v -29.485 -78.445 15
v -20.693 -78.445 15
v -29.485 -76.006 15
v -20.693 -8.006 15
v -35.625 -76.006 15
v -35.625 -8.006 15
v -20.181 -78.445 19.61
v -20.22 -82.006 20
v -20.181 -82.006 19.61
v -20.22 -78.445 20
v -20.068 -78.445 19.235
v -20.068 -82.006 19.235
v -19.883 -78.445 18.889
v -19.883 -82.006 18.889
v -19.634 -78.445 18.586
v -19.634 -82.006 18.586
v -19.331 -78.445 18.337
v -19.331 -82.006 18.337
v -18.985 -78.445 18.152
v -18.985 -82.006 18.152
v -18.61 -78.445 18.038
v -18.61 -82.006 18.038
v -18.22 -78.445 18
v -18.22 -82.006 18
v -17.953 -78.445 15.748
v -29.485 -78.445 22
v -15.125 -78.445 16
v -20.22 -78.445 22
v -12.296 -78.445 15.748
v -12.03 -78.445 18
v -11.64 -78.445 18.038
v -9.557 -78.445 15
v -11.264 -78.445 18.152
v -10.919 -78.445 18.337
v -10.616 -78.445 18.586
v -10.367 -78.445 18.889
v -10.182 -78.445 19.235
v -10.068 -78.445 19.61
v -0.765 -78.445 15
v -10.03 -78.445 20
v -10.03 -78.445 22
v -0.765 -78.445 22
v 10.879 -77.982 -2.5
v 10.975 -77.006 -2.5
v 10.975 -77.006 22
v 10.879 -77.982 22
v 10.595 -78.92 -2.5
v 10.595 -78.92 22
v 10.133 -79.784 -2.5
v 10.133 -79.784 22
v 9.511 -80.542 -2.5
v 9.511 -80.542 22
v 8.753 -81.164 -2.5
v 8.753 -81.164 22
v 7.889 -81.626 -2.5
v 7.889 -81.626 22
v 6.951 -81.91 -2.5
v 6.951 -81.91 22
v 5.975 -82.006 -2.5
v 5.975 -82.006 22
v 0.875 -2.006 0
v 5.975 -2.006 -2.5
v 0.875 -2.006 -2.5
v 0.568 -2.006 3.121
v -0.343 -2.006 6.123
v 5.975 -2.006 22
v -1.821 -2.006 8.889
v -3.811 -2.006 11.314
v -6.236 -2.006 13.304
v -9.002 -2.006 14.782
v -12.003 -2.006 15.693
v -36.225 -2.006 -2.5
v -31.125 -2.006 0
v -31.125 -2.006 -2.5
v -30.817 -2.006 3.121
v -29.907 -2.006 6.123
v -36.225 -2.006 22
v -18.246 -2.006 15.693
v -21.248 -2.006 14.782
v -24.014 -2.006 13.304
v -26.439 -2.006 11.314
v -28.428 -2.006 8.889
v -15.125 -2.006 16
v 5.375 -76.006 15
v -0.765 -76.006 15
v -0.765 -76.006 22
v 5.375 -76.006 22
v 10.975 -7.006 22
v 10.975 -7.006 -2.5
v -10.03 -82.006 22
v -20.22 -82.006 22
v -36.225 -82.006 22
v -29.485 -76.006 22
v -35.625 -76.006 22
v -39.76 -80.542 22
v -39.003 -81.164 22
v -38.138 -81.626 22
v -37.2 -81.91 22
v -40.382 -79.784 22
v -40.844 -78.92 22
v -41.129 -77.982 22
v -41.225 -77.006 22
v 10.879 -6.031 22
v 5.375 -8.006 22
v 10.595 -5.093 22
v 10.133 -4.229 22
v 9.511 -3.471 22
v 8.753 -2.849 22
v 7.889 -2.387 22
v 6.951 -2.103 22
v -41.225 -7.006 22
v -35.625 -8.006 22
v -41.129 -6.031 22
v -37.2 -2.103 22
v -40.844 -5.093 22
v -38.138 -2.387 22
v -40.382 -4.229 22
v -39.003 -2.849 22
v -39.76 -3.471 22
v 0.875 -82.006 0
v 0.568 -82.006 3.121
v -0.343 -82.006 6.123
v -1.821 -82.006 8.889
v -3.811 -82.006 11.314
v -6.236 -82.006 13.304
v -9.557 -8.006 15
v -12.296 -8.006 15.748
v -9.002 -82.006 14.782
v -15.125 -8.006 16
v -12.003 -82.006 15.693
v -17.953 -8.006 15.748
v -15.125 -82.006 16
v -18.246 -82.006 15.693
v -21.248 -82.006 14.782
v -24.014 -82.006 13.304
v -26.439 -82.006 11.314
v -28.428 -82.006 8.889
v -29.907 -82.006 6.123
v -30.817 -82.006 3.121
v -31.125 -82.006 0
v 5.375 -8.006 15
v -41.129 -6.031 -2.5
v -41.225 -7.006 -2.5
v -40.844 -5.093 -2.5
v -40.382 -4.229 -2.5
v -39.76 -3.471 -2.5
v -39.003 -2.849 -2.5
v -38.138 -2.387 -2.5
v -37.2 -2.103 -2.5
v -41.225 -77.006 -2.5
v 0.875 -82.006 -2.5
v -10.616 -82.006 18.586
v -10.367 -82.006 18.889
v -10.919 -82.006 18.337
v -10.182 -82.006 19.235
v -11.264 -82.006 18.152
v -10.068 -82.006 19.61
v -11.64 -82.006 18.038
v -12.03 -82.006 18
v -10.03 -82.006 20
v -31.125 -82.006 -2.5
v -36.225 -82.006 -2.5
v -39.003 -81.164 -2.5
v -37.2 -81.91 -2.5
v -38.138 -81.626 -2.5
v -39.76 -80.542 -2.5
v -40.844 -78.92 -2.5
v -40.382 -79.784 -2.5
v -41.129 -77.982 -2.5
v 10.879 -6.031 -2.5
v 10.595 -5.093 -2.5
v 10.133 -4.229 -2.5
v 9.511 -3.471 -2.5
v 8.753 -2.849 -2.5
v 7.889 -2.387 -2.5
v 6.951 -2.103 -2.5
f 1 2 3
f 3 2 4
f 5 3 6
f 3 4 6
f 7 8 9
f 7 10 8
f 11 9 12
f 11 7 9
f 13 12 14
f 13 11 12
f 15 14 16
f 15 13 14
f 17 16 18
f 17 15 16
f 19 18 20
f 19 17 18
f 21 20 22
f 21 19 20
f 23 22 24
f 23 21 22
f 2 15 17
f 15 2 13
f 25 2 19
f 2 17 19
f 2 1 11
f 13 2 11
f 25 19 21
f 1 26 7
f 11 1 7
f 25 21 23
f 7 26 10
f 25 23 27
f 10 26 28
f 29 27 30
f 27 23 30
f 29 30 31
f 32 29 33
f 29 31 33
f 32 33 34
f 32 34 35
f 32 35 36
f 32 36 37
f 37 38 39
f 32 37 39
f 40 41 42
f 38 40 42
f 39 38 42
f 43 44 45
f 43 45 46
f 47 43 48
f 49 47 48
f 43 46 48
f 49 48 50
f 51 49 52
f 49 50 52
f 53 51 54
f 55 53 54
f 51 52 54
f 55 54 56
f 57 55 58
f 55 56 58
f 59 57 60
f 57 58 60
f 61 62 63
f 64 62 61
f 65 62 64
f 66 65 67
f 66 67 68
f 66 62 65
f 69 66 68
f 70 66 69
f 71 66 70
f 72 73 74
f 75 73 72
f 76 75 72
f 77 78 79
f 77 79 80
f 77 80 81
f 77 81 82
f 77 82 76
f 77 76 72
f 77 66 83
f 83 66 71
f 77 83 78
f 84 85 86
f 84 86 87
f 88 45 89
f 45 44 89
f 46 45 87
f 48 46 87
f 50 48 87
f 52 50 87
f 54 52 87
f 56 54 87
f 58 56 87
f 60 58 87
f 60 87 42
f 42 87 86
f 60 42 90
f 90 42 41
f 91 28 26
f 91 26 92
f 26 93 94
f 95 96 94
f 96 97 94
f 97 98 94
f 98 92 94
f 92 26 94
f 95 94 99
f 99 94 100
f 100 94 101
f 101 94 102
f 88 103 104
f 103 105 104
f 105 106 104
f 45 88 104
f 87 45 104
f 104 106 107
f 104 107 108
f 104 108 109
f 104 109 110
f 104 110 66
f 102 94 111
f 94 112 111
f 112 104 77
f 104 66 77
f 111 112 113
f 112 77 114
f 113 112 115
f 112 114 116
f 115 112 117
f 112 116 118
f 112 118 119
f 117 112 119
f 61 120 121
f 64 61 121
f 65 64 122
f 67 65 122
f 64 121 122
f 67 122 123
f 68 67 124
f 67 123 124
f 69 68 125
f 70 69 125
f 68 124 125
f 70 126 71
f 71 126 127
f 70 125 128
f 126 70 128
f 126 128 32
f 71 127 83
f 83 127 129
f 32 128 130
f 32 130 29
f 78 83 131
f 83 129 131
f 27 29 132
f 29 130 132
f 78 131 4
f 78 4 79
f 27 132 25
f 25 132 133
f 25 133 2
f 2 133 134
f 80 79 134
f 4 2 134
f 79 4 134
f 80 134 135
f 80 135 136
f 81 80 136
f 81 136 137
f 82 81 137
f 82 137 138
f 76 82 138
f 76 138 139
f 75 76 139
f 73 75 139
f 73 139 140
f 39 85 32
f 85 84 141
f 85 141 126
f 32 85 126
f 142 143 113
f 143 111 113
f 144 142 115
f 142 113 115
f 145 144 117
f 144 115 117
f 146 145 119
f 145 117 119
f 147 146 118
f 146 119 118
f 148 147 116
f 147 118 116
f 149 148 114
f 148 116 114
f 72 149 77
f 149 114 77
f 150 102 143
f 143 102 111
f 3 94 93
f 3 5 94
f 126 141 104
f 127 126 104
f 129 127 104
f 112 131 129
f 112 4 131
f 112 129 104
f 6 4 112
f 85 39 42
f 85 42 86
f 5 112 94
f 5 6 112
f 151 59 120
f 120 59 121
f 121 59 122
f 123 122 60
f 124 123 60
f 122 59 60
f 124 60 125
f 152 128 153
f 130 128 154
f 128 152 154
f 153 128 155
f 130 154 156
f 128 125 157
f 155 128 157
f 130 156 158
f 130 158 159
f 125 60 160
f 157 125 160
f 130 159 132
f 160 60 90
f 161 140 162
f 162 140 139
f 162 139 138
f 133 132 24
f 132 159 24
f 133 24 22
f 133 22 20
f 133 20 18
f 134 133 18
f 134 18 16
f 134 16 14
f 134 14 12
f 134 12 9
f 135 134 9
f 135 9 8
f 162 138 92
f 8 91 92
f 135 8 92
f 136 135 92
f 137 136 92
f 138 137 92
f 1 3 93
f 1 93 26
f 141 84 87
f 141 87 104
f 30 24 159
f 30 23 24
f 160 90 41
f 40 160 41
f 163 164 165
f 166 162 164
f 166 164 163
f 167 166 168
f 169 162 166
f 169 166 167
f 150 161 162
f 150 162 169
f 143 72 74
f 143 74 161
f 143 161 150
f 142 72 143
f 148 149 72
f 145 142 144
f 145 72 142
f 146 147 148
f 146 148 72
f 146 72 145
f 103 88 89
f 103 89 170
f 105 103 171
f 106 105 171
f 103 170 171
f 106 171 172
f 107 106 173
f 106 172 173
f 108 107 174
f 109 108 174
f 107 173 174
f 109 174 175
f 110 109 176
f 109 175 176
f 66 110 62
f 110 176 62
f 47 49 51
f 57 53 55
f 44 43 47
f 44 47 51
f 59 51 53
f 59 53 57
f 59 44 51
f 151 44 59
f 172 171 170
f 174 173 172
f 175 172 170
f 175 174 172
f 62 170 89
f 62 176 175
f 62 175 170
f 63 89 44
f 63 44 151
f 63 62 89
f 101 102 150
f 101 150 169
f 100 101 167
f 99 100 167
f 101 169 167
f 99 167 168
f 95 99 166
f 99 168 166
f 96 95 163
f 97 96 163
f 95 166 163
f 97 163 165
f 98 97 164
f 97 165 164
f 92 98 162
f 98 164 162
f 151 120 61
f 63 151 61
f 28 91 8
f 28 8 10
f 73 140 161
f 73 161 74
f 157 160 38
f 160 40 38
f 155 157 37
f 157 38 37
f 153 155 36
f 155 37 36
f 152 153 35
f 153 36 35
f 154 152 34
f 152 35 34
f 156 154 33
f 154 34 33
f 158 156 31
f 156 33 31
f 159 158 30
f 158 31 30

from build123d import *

# Parameters (mm, degrees)
ESQUISSE1_W             = 52.2
ESQUISSE1_H             = 80
BOSS_EXTRU_2_DEPTH      = 22
ESQUISSE3_W             = 48.72
ESQUISSE3_H             = 72.8776
ENL_V_MAT_EXTRU_1_DEPTH = 5
CONG_1_R                = 10
BOSS_EXTRU_4_DEPTH      = 5
ESQUISSE2_R             = 16
ENL_V_MAT_EXTRU_3_DEPTH = 93.647092521
ENL_V_MAT_EXTRU_5_DEPTH = 2
ESQUISSE8_W             = 10.19
ESQUISSE8_H             = 3.5612
ENL_V_MAT_EXTRU_6_DEPTH = 4
CONG_3_R                = 2
ESQUISSE9_W             = 10.1
ESQUISSE9_H             = 80
BOSS_EXTRU_5_DEPTH      = 2.5
CONG_4_R                = 5


with BuildPart() as part:
    # Esquisse1 → Boss.-Extru.2 (new body)
    with BuildSketch(Plane.XY):
        with Locations((-15.124795362, -42.006460905)):
            Rectangle(ESQUISSE1_W, ESQUISSE1_H)
    extrude(amount=BOSS_EXTRU_2_DEPTH)

    # Esquisse3 → Enlèv. mat.-Extru.1 (cut)
    with BuildSketch(Plane.XY.offset(22)):
        with Locations((-15.124795362, -42.006460905)):
            Rectangle(ESQUISSE3_W, ESQUISSE3_H)
    extrude(amount=-ENL_V_MAT_EXTRU_1_DEPTH, mode=Mode.SUBTRACT)

    # Congé1
    cong_1_edges = [part.edges().sort_by_distance(p)[0] for p in [
        (-39.484795362, -78.445260905, 19.5),
        (-39.484795362, -5.567660905, 19.5),
        (9.235204638, -5.567660905, 19.5),
        (9.235204638, -78.445260905, 19.5),
    ]]
    fillet(cong_1_edges, radius=CONG_1_R)

    # Esquisse5 → Boss.-Extru.4 (add)
    with BuildSketch(Plane.XY.offset(17)):
        with BuildLine():
            Line((-35.624795362, -68.445260905), (-35.624795362, -76.006460905))
            Line((-35.624795362, -76.006460905), (-29.484795362, -76.006460905))
            Line((-29.484795362, -76.006460905), (-29.484795362, -78.445260905))
            ThreePointArc((-29.484795362, -78.445260905), (-36.555863174, -75.516328717), (-39.484795362, -68.445260905))
            Line((-39.484795362, -68.445260905), (-39.484795362, -15.567660905))
            ThreePointArc((-39.484795362, -15.567660905), (-36.555863174, -8.496593093), (-29.484795362, -5.567660905))
            Line((-29.484795362, -5.567660905), (-0.764795362, -5.567660905))
            ThreePointArc((-0.764795362, -5.567660905), (6.30627245, -8.496593093), (9.235204638, -15.567660905))
            Line((9.235204638, -15.567660905), (9.235204638, -68.445260905))
            ThreePointArc((9.235204638, -68.445260905), (6.30627245, -75.516328717), (-0.764795362, -78.445260905))
            Line((-0.764795362, -78.445260905), (-0.764795362, -76.006460905))
            Line((-0.764795362, -76.006460905), (5.375204638, -76.006460905))
            Line((5.375204638, -76.006460905), (5.375204638, -68.445260905))
            Line((5.375204638, -68.445260905), (5.375204638, -15.567660905))
            Line((5.375204638, -15.567660905), (5.375204638, -8.006460905))
            Line((5.375204638, -8.006460905), (-35.624795362, -8.006460905))
            Line((-35.624795362, -8.006460905), (-35.624795362, -15.567660905))
            Line((-35.624795362, -15.567660905), (-35.624795362, -68.445260905))
        make_face()
    extrude(amount=BOSS_EXTRU_4_DEPTH)

    # Esquisse2 → Enlèv. mat.-Extru.3 (cut, through all)
    with BuildSketch(Plane.XZ.offset(82.006460905)):
        with Locations((-15.124795362, 0)):
            Circle(ESQUISSE2_R)
    extrude(amount=-ENL_V_MAT_EXTRU_3_DEPTH, mode=Mode.SUBTRACT)

    # Esquisse7 → Enlèv. mat.-Extru.5 (cut)
    with BuildSketch(Plane.XY.offset(17)):
        Polygon((-35.624795362, -8.006460905), (5.375204638, -8.006460905), (5.375204638, -76.006460905), (-0.764795362, -76.006460905), (-0.764795362, -78.445260905), (-29.484795362, -78.445260905), (-29.484795362, -76.006460905), (-35.624795362, -76.006460905), align=None)
    extrude(amount=-ENL_V_MAT_EXTRU_5_DEPTH, mode=Mode.SUBTRACT)

    # Esquisse8 → Enlèv. mat.-Extru.6 (cut)
    with BuildSketch(Plane.XY.offset(22)):
        with Locations((-15.124795362, -80.225860905)):
            Rectangle(ESQUISSE8_W, ESQUISSE8_H)
    extrude(amount=-ENL_V_MAT_EXTRU_6_DEPTH, mode=Mode.SUBTRACT)

    # Congé3
    cong_3_edges = [part.edges().sort_by_distance(p)[0] for p in [
        (-20.219795362, -80.225860905, 18),
        (-10.029795362, -80.225860905, 18),
    ]]
    fillet(cong_3_edges, radius=CONG_3_R)

    # Esquisse9 → Boss.-Extru.5 (add)
    with BuildSketch(Plane(origin=(0, 0, 0), x_dir=(-1, 0, 0), z_dir=(0, 0, -1))):
        with Locations((36.174795362, -42.006460905)):
            Rectangle(ESQUISSE9_W, ESQUISSE9_H)
        with Locations((-5.925204638, -42.006460905)):
            Rectangle(ESQUISSE9_W, ESQUISSE9_H)
    extrude(amount=BOSS_EXTRU_5_DEPTH)

    # Congé4
    cong_4_edges = [part.edges().sort_by_distance(p)[0] for p in [
        (-41.224795362, -2.006460905, 9.75),
        (10.975204638, -2.006460905, 9.75),
        (10.975204638, -82.006460905, 9.75),
        (-41.224795362, -82.006460905, 9.75),
    ]]
    fillet(cong_4_edges, radius=CONG_4_R)


solid = part.part
